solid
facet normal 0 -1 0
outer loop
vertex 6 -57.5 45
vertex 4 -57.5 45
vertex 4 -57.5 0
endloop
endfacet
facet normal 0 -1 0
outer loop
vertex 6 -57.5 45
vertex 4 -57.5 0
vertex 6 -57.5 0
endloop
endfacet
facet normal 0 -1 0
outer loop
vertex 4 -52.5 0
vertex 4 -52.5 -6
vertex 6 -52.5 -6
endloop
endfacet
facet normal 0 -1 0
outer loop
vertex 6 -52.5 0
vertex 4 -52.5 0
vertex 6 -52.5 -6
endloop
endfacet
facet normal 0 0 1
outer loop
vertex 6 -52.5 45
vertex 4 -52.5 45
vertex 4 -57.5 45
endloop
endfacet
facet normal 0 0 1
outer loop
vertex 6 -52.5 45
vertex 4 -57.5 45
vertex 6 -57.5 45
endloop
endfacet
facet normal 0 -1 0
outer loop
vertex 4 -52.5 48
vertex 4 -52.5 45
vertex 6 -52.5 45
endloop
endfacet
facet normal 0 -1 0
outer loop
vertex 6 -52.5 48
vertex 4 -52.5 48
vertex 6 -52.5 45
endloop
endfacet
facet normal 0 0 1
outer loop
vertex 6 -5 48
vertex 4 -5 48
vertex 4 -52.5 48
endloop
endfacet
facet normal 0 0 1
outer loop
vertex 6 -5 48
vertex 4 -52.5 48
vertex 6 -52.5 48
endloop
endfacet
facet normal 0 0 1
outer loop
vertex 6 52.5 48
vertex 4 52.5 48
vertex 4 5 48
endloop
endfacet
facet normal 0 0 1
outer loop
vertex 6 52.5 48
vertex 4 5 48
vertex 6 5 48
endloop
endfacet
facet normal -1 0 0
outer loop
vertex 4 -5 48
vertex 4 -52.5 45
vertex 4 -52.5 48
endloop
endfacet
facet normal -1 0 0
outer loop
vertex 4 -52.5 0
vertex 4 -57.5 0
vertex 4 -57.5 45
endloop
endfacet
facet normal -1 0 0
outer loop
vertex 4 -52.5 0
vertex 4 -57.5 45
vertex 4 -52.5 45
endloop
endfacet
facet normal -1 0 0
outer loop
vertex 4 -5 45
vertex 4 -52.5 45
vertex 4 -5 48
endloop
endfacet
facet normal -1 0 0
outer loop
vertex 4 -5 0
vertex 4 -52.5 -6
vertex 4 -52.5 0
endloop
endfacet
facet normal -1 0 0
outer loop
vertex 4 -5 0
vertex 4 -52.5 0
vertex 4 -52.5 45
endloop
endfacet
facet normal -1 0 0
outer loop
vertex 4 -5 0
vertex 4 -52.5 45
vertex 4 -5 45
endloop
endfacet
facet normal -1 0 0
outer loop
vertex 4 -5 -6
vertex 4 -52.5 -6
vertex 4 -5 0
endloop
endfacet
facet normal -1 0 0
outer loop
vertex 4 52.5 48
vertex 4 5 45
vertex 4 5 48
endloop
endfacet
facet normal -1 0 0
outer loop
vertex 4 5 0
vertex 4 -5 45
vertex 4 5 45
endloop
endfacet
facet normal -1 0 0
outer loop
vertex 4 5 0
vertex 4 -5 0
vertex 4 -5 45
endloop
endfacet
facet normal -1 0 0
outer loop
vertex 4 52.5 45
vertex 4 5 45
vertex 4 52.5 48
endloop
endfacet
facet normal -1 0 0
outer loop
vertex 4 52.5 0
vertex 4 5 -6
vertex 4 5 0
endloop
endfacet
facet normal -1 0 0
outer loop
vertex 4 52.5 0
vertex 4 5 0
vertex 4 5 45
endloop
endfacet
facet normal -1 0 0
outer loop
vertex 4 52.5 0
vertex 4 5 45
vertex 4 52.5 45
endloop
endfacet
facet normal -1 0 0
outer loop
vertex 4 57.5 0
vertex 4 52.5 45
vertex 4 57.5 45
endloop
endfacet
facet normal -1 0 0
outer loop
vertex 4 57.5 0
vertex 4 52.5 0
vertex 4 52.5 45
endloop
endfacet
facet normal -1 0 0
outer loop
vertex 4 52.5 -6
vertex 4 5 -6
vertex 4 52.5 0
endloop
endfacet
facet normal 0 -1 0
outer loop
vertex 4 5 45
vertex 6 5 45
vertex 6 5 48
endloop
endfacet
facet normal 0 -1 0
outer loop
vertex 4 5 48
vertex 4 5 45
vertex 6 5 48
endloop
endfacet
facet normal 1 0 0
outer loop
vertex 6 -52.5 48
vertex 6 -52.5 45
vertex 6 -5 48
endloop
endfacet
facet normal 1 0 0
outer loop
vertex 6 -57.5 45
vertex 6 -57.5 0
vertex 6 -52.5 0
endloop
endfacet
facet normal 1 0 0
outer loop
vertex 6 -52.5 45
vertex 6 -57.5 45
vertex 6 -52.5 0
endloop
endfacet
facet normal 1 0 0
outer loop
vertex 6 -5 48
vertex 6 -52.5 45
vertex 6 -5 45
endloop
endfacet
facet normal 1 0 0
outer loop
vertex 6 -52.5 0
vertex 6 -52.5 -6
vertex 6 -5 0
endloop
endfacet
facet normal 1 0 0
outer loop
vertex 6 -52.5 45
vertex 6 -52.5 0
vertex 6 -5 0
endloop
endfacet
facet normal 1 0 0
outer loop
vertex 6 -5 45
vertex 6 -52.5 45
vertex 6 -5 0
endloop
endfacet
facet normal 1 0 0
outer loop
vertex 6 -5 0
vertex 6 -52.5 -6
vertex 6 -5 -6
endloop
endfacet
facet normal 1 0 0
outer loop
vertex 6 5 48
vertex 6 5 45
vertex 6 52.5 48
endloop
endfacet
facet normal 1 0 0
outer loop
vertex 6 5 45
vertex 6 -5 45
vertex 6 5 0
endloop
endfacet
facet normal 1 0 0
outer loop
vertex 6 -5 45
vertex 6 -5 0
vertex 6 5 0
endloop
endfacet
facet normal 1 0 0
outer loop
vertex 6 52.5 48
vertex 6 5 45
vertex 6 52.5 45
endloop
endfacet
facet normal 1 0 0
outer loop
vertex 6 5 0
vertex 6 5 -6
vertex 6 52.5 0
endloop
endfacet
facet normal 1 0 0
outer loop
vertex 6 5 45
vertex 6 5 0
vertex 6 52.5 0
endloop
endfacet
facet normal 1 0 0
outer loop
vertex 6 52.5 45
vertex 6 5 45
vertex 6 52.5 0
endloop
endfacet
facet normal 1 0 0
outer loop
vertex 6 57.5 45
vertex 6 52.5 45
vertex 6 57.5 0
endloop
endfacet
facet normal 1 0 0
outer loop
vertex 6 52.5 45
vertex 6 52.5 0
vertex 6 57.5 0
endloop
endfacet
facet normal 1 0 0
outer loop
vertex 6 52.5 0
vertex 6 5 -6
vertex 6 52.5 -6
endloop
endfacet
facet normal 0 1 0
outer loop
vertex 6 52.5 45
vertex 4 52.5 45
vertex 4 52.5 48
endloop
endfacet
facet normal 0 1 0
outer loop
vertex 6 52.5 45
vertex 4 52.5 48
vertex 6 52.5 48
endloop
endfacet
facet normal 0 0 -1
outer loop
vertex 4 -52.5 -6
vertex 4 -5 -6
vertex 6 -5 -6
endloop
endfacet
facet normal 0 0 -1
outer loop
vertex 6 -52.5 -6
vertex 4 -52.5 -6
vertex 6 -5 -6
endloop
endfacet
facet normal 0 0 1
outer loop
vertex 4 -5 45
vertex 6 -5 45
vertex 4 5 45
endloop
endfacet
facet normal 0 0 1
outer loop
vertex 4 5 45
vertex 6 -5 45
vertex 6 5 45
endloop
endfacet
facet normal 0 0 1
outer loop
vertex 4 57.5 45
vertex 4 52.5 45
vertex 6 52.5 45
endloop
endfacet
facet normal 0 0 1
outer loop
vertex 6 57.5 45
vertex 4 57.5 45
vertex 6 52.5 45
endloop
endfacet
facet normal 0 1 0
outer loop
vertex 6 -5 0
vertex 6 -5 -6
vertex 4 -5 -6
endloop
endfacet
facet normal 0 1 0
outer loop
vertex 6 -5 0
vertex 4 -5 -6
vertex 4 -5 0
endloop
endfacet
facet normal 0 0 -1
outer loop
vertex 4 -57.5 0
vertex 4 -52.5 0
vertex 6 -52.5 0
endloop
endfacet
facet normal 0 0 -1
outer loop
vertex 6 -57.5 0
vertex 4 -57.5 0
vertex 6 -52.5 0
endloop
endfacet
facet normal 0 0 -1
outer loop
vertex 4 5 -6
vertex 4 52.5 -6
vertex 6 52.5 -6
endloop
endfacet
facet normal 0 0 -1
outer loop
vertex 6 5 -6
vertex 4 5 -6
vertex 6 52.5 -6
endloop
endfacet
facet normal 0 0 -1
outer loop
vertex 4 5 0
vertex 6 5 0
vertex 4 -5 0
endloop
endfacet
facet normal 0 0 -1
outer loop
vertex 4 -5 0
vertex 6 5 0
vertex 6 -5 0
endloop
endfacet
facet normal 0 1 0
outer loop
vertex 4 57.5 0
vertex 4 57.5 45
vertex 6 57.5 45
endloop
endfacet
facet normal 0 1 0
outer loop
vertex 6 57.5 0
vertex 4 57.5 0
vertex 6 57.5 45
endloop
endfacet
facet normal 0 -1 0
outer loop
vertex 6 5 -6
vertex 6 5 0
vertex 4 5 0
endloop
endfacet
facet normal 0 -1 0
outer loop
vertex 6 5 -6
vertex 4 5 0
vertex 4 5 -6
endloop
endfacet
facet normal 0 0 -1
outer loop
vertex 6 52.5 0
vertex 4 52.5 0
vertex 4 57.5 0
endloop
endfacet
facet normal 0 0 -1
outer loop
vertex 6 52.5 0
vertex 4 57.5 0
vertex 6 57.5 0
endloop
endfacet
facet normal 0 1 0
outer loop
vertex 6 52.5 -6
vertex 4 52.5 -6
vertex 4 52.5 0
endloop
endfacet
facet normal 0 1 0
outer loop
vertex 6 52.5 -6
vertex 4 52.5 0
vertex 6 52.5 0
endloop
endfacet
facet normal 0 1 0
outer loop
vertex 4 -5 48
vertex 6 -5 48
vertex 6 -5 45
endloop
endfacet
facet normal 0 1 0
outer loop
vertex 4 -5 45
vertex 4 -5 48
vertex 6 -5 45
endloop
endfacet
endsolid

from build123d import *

# Parameters (mm, degrees)
ESTRUSIONE_ESTRUSIONE1_DEPTH      = 48
ESTRUSIONE_ESTRUSIONE1_DEPTH_BACK = 6
SCHIZZO1_W                        = 2
SCHIZZO1_H                        = 105
TAGLIO_ESTRUSIONE1_DEPTH          = 10
SCHIZZO3_W                        = 2
SCHIZZO3_H                        = 45
ESTRUSIONE_ESTRUSIONE2_DEPTH      = 5


with BuildPart() as part:
    # Schizzo1 → Estrusione-Estrusione1 (new, two sides: drawn at the far end of the back side and taken through both)
    with BuildSketch(Plane.XY.offset(-ESTRUSIONE_ESTRUSIONE1_DEPTH_BACK)):
        with Locations((5, 0)):
            Rectangle(SCHIZZO1_W, SCHIZZO1_H)
    extrude(amount=ESTRUSIONE_ESTRUSIONE1_DEPTH + ESTRUSIONE_ESTRUSIONE1_DEPTH_BACK)

    # Schizzo2 → Taglio-Estrusione1 (cut)
    with BuildSketch(Plane(origin=(6, 0, 0), x_dir=(0, 0, -1), z_dir=(1, 0, 0))):
        Polygon((-48, -5), (-45, -5), (-45, 0), (-45, 5), (-48, 5), align=None)
        Polygon((6, -5), (0, -5), (0, 0), (0, 5), (6, 5), align=None)
    extrude(amount=-TAGLIO_ESTRUSIONE1_DEPTH, mode=Mode.SUBTRACT)

    # Schizzo3 → Estrusione-Estrusione2 (add)
    with BuildSketch(Plane.XZ.offset(52.5)):
        with Locations((5, 22.5)):
            Rectangle(SCHIZZO3_W, SCHIZZO3_H)
    estrusione_estrusione2 = extrude(amount=ESTRUSIONE_ESTRUSIONE2_DEPTH)

    # Specchia1: Estrusione-Estrusione2 across plane
    add(estrusione_estrusione2.mirror(Plane(origin=(0, 0, 0), x_dir=(0, 0, 1), z_dir=(0, -1, 0))))


solid = part.part
